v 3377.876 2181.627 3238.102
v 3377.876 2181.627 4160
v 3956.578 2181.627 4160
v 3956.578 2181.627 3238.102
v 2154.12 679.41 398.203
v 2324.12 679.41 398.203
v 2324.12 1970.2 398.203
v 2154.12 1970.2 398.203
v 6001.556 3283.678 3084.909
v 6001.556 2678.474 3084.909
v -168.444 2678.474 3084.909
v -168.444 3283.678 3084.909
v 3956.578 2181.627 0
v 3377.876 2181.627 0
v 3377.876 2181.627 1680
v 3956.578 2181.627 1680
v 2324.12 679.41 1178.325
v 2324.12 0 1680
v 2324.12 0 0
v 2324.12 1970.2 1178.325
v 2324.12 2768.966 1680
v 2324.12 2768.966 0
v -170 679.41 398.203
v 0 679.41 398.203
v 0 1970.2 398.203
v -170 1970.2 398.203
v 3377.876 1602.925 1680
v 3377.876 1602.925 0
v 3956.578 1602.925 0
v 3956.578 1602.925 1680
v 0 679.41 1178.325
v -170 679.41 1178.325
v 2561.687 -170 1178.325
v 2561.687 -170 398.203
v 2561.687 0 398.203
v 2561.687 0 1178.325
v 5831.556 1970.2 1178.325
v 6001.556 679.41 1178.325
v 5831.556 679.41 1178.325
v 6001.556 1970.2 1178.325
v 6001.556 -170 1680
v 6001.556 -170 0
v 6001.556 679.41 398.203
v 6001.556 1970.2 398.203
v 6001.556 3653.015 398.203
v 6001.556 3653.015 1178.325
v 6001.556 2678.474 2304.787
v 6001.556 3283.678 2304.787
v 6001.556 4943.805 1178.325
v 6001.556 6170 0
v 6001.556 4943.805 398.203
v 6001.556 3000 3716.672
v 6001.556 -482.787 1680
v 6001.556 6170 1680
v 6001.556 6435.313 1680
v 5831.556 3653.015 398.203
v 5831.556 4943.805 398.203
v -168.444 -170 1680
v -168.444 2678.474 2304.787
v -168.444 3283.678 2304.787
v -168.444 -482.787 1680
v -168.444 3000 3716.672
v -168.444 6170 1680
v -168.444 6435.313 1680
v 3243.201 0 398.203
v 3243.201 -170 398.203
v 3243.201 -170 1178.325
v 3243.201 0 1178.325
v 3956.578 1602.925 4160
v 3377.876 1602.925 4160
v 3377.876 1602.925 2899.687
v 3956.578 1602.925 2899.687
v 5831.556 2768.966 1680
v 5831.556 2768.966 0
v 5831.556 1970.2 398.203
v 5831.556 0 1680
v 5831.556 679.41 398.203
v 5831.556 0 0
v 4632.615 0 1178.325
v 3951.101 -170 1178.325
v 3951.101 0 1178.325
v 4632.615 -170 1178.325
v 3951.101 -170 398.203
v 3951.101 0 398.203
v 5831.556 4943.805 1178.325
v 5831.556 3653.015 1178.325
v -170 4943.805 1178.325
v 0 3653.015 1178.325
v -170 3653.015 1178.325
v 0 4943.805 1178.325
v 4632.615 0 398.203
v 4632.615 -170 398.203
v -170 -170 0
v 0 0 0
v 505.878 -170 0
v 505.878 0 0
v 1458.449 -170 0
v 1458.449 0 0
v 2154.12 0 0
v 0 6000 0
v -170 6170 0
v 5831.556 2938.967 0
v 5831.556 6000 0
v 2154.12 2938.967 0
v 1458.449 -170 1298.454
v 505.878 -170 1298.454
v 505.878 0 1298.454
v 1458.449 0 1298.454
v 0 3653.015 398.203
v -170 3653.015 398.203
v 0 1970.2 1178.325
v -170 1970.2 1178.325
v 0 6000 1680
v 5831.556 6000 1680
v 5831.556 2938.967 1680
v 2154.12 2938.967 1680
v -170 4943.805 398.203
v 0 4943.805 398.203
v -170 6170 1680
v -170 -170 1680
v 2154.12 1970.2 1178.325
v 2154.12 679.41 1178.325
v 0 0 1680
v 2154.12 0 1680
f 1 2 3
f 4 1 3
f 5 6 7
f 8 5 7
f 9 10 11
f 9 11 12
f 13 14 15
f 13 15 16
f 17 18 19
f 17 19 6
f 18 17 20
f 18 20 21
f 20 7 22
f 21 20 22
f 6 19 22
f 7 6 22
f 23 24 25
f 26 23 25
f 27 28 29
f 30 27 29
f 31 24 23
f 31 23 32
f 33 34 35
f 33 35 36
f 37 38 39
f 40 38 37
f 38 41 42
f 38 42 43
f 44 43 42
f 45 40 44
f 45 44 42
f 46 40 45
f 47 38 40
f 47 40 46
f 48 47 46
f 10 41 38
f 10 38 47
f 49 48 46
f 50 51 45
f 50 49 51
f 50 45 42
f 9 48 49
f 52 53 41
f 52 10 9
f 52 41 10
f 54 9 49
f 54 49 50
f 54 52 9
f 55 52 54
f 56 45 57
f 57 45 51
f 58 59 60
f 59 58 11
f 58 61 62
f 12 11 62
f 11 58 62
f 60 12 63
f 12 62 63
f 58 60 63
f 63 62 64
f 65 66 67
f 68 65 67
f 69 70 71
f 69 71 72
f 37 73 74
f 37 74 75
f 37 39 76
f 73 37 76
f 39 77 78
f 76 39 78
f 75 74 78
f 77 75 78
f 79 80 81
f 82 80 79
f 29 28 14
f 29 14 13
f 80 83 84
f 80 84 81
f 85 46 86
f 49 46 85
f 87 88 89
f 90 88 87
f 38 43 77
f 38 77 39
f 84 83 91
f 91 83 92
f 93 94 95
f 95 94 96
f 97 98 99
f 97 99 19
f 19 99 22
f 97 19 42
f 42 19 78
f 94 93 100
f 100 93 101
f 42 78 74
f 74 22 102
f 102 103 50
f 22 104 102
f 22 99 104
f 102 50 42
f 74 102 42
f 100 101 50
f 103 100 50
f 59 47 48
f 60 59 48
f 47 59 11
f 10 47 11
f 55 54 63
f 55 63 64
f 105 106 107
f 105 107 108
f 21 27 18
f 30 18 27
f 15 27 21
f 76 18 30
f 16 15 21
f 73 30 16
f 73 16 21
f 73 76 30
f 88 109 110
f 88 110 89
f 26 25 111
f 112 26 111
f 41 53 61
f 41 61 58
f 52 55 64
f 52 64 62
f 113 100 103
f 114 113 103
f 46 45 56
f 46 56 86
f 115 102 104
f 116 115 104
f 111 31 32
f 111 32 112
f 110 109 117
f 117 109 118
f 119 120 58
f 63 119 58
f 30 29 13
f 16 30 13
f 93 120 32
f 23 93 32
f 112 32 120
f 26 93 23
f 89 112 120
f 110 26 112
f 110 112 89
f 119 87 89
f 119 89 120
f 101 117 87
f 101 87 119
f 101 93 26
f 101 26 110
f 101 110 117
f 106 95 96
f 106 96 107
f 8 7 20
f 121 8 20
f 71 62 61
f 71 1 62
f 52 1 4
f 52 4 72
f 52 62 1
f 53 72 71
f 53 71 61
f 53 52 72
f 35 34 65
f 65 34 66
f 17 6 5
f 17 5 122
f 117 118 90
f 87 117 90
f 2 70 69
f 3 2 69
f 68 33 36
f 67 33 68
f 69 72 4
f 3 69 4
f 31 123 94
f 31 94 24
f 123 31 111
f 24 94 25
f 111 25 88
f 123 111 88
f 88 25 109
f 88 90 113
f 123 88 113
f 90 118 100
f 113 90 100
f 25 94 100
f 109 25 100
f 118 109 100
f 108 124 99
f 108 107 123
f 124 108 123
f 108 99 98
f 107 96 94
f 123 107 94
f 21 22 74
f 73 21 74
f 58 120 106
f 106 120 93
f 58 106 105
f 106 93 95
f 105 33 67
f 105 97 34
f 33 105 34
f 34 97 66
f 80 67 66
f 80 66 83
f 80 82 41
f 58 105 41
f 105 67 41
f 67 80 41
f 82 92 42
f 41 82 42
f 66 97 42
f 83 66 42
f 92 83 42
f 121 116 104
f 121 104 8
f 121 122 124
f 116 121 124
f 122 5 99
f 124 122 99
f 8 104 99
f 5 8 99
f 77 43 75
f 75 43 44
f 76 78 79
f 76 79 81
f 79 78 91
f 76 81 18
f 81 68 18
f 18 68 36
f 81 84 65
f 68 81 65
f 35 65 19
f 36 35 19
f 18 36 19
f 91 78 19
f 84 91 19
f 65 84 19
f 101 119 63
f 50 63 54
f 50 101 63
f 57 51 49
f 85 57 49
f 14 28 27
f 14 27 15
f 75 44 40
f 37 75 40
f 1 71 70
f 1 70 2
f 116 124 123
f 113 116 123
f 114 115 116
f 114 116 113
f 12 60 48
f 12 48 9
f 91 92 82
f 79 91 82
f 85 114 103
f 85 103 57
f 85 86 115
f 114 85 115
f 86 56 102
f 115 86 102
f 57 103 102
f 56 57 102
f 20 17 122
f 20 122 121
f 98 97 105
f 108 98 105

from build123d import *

# Parameters (mm, degrees)
F0_W     = 6171.556324
F0_H     = 6340.000004
F1_DEPTH = 1680
F2_W     = 952.570618
F2_H     = 1298.453808
F2_W_2   = 681.514025
F2_H_2   = 780.121654
F2_W_3   = 681.514024
F3_DEPTH = 1140
F5_DEPTH = 6170
F6_W     = 1290.790233
F6_H     = 780.121654
F6_W_2   = 605.204105
F7_DEPTH = 7440
F8_W     = 578.701853
F8_H     = 578.701853
F9_DEPTH = 4160


with BuildPart() as f1:
    # F0 (on Top) → F1 (new body)
    with BuildSketch(Plane.XY):
        with Locations((2915.77816, 3000)):
            Rectangle(F0_W, F0_H)
        Polygon((2154.120207, 0), (0, 0), (0, 6000), (5831.55632, 6000), (5831.55632, 2938.966513), (5831.55632, 2768.966436), (5831.55632, 0), (2324.120283, 0), align=None, mode=Mode.SUBTRACT)
        Polygon((2154.120207, 2938.966513), (2154.120207, 0), (2324.120283, 0), (2324.120283, 2768.966436), (5831.55632, 2768.966436), (5831.55632, 2938.966513), align=None)
    extrude(amount=F1_DEPTH)

    # F2 (on face) → F3 (cut)
    with BuildSketch(Plane.XZ.offset(170.000002)):
        with Locations((982.163459, 649.226904)):
            Rectangle(F2_W, F2_H)
        with Locations((2902.444481, 788.26423)):
            Rectangle(F2_W_2, F2_H_2)
        with Locations((4291.858077, 788.26423)):
            Rectangle(F2_W_3, F2_H_2)
    extrude(amount=-F3_DEPTH, mode=Mode.SUBTRACT)

    # F4 (on face) → F5 (join)
    with BuildSketch(Plane.YZ.offset(6001.556322)):
        Polygon((3000, 3716.6717), (-482.787311, 1680), (6435.312748, 1680), align=None)
    extrude(amount=-F5_DEPTH)

    # F6 (on face) → F7 (cut)
    with BuildSketch(Plane.YZ.offset(6001.556322)):
        with Locations((1324.805267, 788.26423)):
            Rectangle(F6_W, F6_H)
        with Locations((4298.410308, 788.26423)):
            Rectangle(F6_W, F6_H)
        with Locations((2981.075763, 2694.847748)):
            Rectangle(F6_W_2, F6_H)
    extrude(amount=-F7_DEPTH, mode=Mode.SUBTRACT)

    # F8 (on Top) → F9 (join)
    with BuildSketch(Plane.XY):
        with Locations((3667.22709, 1892.276228)):
            Rectangle(F8_W, F8_H)
    extrude(amount=F9_DEPTH)


solid = f1.part
